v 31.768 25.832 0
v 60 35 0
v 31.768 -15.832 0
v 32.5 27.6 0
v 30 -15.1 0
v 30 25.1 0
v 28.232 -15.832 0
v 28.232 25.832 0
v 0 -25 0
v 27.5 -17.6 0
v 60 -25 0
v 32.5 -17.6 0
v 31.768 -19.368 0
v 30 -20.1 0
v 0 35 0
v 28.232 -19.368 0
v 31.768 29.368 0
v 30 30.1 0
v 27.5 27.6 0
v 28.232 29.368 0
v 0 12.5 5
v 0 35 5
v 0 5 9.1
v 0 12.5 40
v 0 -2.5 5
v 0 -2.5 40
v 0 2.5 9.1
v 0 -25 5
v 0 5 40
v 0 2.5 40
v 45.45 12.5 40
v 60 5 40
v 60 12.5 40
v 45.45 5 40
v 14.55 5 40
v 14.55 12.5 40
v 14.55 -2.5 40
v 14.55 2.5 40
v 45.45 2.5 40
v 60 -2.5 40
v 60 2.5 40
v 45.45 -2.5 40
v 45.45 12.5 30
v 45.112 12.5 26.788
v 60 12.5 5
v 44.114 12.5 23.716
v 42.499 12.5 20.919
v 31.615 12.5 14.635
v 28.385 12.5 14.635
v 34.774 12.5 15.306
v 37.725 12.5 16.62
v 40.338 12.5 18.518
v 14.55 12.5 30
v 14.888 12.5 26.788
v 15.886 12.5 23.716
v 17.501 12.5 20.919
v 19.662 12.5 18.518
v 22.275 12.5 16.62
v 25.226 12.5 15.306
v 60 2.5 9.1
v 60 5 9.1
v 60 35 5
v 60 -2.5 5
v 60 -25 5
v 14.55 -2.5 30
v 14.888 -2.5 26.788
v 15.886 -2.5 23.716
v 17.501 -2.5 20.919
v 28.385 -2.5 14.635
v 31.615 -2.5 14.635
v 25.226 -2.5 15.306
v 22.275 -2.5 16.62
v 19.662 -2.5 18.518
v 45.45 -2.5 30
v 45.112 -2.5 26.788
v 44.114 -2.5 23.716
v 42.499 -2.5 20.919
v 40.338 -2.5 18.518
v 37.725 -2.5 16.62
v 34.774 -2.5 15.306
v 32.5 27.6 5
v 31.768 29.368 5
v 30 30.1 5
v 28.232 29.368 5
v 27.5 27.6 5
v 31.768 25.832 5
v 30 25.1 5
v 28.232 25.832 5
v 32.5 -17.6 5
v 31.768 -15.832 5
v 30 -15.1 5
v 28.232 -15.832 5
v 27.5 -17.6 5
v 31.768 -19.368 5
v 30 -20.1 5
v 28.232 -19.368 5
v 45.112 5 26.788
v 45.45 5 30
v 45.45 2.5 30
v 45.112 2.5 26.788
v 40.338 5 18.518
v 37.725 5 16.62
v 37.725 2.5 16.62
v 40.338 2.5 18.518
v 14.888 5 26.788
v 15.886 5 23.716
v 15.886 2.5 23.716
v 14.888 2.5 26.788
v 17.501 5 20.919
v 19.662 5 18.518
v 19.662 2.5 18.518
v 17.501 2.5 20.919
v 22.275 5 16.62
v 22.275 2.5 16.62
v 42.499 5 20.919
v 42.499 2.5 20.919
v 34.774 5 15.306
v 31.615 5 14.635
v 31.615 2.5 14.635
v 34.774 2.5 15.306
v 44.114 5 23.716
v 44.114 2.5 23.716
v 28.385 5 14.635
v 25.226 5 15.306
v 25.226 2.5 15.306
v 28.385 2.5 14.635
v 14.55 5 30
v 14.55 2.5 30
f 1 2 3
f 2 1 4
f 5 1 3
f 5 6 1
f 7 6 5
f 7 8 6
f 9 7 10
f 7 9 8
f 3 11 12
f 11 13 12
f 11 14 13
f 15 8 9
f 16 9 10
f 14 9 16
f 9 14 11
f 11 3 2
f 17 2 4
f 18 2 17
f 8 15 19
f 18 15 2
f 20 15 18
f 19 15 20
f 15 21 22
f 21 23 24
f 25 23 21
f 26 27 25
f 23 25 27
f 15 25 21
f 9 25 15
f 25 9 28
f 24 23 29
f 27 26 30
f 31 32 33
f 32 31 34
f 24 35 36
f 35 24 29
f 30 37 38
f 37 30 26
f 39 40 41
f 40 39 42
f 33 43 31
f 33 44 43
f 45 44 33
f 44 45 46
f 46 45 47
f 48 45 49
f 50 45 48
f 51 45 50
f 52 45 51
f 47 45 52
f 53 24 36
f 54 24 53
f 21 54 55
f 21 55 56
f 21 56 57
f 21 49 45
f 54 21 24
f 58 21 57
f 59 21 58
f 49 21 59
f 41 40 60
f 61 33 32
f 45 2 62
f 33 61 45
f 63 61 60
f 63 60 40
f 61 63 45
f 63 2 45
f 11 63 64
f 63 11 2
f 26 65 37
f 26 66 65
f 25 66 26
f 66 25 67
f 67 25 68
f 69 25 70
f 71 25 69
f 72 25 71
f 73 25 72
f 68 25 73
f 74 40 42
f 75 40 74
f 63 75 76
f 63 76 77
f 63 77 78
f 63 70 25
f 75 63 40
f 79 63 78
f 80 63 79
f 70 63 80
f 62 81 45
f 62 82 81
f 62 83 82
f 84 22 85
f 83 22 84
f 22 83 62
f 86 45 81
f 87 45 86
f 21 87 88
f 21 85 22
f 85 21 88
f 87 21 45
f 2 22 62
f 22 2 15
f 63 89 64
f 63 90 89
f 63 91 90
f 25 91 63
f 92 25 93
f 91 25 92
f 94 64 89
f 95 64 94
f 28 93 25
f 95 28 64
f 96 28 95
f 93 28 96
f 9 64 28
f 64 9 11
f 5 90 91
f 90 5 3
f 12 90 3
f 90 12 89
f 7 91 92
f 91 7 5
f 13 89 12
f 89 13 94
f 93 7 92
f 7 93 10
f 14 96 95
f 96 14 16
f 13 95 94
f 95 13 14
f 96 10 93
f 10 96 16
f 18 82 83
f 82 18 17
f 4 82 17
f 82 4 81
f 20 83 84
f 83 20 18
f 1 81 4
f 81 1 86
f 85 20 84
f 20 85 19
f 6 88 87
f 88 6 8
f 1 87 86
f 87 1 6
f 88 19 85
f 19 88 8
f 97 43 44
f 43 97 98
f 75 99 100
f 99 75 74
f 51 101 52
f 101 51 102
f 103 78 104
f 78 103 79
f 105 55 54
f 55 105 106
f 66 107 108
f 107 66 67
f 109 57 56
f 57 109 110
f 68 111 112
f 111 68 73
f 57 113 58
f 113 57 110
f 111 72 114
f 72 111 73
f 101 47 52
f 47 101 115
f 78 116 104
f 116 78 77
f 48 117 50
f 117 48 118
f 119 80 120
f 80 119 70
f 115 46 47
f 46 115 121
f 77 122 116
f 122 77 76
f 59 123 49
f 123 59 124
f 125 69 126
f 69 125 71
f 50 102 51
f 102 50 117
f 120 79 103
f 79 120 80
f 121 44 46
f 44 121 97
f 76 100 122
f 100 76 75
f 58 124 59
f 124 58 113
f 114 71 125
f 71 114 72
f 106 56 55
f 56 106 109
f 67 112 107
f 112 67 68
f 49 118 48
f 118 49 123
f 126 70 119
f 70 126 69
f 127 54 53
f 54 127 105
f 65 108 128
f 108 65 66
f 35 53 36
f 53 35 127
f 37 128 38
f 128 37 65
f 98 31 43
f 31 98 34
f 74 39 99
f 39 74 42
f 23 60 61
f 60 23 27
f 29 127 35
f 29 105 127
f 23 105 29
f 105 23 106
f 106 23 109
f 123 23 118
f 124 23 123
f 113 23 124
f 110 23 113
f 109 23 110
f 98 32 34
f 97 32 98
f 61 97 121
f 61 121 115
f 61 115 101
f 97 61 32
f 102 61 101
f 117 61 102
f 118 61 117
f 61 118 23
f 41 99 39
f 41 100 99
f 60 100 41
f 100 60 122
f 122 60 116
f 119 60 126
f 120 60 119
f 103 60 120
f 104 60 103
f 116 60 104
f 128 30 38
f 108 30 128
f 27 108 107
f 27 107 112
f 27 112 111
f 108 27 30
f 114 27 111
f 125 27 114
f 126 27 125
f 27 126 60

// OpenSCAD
syringediameter = 30.9;
syringeradius = syringediameter/2;
widthofpart= 10;
sideflapwidth = 60;
holeradius = 2.5;
syringeflap = 2.5;
bigger =5;

difference(){

union(){
translate([0,-bigger/2,20])
    linear_extrude(
    height = 40, 
    center = true, 
    convexity = 10, 
    twist = 0)
    square([60,widthofpart+bigger]);
    
//Top box
translate([0,widthofpart,2.5])
    linear_extrude(
    height = 5, 
    center = true, 
    convexity = 10, 
    twist = 0)
    square([sideflapwidth,25]);
    
//Bottom box
translate([0,-widthofpart-15,2.5])
    linear_extrude(
    height = 5, 
    center = true, 
    convexity = 10, 
    twist = 0)
    square([sideflapwidth,25]);
    
}

//Top hole
translate([30, -20 + 2*1.2, 0])
cylinder (h=widthofpart*2, r=holeradius);

//Bottom hole
translate([30, widthofpart+ 20-2*1.2, 0])
cylinder (h=widthofpart*2, r=holeradius);


//Syringe cut

translate([30, widthofpart+bigger, 30])
rotate([90,0,0])
cylinder (h=widthofpart*2 + bigger, r=syringeradius);

// Square with syringe
translate([30-syringeradius, widthofpart+bigger, 30])
rotate([90,0,0])
    linear_extrude(
    height = syringediameter*2, 
    center = true, 
    convexity = 10, 
    twist = 0)
    square([syringediameter,syringediameter]);



//Flap hole
translate([0,syringeflap, 40])
    linear_extrude(
    height = syringediameter*2, 
    center = true, 
    convexity = 10, 
    twist = 0)
    square([60,syringeflap ]);


}
